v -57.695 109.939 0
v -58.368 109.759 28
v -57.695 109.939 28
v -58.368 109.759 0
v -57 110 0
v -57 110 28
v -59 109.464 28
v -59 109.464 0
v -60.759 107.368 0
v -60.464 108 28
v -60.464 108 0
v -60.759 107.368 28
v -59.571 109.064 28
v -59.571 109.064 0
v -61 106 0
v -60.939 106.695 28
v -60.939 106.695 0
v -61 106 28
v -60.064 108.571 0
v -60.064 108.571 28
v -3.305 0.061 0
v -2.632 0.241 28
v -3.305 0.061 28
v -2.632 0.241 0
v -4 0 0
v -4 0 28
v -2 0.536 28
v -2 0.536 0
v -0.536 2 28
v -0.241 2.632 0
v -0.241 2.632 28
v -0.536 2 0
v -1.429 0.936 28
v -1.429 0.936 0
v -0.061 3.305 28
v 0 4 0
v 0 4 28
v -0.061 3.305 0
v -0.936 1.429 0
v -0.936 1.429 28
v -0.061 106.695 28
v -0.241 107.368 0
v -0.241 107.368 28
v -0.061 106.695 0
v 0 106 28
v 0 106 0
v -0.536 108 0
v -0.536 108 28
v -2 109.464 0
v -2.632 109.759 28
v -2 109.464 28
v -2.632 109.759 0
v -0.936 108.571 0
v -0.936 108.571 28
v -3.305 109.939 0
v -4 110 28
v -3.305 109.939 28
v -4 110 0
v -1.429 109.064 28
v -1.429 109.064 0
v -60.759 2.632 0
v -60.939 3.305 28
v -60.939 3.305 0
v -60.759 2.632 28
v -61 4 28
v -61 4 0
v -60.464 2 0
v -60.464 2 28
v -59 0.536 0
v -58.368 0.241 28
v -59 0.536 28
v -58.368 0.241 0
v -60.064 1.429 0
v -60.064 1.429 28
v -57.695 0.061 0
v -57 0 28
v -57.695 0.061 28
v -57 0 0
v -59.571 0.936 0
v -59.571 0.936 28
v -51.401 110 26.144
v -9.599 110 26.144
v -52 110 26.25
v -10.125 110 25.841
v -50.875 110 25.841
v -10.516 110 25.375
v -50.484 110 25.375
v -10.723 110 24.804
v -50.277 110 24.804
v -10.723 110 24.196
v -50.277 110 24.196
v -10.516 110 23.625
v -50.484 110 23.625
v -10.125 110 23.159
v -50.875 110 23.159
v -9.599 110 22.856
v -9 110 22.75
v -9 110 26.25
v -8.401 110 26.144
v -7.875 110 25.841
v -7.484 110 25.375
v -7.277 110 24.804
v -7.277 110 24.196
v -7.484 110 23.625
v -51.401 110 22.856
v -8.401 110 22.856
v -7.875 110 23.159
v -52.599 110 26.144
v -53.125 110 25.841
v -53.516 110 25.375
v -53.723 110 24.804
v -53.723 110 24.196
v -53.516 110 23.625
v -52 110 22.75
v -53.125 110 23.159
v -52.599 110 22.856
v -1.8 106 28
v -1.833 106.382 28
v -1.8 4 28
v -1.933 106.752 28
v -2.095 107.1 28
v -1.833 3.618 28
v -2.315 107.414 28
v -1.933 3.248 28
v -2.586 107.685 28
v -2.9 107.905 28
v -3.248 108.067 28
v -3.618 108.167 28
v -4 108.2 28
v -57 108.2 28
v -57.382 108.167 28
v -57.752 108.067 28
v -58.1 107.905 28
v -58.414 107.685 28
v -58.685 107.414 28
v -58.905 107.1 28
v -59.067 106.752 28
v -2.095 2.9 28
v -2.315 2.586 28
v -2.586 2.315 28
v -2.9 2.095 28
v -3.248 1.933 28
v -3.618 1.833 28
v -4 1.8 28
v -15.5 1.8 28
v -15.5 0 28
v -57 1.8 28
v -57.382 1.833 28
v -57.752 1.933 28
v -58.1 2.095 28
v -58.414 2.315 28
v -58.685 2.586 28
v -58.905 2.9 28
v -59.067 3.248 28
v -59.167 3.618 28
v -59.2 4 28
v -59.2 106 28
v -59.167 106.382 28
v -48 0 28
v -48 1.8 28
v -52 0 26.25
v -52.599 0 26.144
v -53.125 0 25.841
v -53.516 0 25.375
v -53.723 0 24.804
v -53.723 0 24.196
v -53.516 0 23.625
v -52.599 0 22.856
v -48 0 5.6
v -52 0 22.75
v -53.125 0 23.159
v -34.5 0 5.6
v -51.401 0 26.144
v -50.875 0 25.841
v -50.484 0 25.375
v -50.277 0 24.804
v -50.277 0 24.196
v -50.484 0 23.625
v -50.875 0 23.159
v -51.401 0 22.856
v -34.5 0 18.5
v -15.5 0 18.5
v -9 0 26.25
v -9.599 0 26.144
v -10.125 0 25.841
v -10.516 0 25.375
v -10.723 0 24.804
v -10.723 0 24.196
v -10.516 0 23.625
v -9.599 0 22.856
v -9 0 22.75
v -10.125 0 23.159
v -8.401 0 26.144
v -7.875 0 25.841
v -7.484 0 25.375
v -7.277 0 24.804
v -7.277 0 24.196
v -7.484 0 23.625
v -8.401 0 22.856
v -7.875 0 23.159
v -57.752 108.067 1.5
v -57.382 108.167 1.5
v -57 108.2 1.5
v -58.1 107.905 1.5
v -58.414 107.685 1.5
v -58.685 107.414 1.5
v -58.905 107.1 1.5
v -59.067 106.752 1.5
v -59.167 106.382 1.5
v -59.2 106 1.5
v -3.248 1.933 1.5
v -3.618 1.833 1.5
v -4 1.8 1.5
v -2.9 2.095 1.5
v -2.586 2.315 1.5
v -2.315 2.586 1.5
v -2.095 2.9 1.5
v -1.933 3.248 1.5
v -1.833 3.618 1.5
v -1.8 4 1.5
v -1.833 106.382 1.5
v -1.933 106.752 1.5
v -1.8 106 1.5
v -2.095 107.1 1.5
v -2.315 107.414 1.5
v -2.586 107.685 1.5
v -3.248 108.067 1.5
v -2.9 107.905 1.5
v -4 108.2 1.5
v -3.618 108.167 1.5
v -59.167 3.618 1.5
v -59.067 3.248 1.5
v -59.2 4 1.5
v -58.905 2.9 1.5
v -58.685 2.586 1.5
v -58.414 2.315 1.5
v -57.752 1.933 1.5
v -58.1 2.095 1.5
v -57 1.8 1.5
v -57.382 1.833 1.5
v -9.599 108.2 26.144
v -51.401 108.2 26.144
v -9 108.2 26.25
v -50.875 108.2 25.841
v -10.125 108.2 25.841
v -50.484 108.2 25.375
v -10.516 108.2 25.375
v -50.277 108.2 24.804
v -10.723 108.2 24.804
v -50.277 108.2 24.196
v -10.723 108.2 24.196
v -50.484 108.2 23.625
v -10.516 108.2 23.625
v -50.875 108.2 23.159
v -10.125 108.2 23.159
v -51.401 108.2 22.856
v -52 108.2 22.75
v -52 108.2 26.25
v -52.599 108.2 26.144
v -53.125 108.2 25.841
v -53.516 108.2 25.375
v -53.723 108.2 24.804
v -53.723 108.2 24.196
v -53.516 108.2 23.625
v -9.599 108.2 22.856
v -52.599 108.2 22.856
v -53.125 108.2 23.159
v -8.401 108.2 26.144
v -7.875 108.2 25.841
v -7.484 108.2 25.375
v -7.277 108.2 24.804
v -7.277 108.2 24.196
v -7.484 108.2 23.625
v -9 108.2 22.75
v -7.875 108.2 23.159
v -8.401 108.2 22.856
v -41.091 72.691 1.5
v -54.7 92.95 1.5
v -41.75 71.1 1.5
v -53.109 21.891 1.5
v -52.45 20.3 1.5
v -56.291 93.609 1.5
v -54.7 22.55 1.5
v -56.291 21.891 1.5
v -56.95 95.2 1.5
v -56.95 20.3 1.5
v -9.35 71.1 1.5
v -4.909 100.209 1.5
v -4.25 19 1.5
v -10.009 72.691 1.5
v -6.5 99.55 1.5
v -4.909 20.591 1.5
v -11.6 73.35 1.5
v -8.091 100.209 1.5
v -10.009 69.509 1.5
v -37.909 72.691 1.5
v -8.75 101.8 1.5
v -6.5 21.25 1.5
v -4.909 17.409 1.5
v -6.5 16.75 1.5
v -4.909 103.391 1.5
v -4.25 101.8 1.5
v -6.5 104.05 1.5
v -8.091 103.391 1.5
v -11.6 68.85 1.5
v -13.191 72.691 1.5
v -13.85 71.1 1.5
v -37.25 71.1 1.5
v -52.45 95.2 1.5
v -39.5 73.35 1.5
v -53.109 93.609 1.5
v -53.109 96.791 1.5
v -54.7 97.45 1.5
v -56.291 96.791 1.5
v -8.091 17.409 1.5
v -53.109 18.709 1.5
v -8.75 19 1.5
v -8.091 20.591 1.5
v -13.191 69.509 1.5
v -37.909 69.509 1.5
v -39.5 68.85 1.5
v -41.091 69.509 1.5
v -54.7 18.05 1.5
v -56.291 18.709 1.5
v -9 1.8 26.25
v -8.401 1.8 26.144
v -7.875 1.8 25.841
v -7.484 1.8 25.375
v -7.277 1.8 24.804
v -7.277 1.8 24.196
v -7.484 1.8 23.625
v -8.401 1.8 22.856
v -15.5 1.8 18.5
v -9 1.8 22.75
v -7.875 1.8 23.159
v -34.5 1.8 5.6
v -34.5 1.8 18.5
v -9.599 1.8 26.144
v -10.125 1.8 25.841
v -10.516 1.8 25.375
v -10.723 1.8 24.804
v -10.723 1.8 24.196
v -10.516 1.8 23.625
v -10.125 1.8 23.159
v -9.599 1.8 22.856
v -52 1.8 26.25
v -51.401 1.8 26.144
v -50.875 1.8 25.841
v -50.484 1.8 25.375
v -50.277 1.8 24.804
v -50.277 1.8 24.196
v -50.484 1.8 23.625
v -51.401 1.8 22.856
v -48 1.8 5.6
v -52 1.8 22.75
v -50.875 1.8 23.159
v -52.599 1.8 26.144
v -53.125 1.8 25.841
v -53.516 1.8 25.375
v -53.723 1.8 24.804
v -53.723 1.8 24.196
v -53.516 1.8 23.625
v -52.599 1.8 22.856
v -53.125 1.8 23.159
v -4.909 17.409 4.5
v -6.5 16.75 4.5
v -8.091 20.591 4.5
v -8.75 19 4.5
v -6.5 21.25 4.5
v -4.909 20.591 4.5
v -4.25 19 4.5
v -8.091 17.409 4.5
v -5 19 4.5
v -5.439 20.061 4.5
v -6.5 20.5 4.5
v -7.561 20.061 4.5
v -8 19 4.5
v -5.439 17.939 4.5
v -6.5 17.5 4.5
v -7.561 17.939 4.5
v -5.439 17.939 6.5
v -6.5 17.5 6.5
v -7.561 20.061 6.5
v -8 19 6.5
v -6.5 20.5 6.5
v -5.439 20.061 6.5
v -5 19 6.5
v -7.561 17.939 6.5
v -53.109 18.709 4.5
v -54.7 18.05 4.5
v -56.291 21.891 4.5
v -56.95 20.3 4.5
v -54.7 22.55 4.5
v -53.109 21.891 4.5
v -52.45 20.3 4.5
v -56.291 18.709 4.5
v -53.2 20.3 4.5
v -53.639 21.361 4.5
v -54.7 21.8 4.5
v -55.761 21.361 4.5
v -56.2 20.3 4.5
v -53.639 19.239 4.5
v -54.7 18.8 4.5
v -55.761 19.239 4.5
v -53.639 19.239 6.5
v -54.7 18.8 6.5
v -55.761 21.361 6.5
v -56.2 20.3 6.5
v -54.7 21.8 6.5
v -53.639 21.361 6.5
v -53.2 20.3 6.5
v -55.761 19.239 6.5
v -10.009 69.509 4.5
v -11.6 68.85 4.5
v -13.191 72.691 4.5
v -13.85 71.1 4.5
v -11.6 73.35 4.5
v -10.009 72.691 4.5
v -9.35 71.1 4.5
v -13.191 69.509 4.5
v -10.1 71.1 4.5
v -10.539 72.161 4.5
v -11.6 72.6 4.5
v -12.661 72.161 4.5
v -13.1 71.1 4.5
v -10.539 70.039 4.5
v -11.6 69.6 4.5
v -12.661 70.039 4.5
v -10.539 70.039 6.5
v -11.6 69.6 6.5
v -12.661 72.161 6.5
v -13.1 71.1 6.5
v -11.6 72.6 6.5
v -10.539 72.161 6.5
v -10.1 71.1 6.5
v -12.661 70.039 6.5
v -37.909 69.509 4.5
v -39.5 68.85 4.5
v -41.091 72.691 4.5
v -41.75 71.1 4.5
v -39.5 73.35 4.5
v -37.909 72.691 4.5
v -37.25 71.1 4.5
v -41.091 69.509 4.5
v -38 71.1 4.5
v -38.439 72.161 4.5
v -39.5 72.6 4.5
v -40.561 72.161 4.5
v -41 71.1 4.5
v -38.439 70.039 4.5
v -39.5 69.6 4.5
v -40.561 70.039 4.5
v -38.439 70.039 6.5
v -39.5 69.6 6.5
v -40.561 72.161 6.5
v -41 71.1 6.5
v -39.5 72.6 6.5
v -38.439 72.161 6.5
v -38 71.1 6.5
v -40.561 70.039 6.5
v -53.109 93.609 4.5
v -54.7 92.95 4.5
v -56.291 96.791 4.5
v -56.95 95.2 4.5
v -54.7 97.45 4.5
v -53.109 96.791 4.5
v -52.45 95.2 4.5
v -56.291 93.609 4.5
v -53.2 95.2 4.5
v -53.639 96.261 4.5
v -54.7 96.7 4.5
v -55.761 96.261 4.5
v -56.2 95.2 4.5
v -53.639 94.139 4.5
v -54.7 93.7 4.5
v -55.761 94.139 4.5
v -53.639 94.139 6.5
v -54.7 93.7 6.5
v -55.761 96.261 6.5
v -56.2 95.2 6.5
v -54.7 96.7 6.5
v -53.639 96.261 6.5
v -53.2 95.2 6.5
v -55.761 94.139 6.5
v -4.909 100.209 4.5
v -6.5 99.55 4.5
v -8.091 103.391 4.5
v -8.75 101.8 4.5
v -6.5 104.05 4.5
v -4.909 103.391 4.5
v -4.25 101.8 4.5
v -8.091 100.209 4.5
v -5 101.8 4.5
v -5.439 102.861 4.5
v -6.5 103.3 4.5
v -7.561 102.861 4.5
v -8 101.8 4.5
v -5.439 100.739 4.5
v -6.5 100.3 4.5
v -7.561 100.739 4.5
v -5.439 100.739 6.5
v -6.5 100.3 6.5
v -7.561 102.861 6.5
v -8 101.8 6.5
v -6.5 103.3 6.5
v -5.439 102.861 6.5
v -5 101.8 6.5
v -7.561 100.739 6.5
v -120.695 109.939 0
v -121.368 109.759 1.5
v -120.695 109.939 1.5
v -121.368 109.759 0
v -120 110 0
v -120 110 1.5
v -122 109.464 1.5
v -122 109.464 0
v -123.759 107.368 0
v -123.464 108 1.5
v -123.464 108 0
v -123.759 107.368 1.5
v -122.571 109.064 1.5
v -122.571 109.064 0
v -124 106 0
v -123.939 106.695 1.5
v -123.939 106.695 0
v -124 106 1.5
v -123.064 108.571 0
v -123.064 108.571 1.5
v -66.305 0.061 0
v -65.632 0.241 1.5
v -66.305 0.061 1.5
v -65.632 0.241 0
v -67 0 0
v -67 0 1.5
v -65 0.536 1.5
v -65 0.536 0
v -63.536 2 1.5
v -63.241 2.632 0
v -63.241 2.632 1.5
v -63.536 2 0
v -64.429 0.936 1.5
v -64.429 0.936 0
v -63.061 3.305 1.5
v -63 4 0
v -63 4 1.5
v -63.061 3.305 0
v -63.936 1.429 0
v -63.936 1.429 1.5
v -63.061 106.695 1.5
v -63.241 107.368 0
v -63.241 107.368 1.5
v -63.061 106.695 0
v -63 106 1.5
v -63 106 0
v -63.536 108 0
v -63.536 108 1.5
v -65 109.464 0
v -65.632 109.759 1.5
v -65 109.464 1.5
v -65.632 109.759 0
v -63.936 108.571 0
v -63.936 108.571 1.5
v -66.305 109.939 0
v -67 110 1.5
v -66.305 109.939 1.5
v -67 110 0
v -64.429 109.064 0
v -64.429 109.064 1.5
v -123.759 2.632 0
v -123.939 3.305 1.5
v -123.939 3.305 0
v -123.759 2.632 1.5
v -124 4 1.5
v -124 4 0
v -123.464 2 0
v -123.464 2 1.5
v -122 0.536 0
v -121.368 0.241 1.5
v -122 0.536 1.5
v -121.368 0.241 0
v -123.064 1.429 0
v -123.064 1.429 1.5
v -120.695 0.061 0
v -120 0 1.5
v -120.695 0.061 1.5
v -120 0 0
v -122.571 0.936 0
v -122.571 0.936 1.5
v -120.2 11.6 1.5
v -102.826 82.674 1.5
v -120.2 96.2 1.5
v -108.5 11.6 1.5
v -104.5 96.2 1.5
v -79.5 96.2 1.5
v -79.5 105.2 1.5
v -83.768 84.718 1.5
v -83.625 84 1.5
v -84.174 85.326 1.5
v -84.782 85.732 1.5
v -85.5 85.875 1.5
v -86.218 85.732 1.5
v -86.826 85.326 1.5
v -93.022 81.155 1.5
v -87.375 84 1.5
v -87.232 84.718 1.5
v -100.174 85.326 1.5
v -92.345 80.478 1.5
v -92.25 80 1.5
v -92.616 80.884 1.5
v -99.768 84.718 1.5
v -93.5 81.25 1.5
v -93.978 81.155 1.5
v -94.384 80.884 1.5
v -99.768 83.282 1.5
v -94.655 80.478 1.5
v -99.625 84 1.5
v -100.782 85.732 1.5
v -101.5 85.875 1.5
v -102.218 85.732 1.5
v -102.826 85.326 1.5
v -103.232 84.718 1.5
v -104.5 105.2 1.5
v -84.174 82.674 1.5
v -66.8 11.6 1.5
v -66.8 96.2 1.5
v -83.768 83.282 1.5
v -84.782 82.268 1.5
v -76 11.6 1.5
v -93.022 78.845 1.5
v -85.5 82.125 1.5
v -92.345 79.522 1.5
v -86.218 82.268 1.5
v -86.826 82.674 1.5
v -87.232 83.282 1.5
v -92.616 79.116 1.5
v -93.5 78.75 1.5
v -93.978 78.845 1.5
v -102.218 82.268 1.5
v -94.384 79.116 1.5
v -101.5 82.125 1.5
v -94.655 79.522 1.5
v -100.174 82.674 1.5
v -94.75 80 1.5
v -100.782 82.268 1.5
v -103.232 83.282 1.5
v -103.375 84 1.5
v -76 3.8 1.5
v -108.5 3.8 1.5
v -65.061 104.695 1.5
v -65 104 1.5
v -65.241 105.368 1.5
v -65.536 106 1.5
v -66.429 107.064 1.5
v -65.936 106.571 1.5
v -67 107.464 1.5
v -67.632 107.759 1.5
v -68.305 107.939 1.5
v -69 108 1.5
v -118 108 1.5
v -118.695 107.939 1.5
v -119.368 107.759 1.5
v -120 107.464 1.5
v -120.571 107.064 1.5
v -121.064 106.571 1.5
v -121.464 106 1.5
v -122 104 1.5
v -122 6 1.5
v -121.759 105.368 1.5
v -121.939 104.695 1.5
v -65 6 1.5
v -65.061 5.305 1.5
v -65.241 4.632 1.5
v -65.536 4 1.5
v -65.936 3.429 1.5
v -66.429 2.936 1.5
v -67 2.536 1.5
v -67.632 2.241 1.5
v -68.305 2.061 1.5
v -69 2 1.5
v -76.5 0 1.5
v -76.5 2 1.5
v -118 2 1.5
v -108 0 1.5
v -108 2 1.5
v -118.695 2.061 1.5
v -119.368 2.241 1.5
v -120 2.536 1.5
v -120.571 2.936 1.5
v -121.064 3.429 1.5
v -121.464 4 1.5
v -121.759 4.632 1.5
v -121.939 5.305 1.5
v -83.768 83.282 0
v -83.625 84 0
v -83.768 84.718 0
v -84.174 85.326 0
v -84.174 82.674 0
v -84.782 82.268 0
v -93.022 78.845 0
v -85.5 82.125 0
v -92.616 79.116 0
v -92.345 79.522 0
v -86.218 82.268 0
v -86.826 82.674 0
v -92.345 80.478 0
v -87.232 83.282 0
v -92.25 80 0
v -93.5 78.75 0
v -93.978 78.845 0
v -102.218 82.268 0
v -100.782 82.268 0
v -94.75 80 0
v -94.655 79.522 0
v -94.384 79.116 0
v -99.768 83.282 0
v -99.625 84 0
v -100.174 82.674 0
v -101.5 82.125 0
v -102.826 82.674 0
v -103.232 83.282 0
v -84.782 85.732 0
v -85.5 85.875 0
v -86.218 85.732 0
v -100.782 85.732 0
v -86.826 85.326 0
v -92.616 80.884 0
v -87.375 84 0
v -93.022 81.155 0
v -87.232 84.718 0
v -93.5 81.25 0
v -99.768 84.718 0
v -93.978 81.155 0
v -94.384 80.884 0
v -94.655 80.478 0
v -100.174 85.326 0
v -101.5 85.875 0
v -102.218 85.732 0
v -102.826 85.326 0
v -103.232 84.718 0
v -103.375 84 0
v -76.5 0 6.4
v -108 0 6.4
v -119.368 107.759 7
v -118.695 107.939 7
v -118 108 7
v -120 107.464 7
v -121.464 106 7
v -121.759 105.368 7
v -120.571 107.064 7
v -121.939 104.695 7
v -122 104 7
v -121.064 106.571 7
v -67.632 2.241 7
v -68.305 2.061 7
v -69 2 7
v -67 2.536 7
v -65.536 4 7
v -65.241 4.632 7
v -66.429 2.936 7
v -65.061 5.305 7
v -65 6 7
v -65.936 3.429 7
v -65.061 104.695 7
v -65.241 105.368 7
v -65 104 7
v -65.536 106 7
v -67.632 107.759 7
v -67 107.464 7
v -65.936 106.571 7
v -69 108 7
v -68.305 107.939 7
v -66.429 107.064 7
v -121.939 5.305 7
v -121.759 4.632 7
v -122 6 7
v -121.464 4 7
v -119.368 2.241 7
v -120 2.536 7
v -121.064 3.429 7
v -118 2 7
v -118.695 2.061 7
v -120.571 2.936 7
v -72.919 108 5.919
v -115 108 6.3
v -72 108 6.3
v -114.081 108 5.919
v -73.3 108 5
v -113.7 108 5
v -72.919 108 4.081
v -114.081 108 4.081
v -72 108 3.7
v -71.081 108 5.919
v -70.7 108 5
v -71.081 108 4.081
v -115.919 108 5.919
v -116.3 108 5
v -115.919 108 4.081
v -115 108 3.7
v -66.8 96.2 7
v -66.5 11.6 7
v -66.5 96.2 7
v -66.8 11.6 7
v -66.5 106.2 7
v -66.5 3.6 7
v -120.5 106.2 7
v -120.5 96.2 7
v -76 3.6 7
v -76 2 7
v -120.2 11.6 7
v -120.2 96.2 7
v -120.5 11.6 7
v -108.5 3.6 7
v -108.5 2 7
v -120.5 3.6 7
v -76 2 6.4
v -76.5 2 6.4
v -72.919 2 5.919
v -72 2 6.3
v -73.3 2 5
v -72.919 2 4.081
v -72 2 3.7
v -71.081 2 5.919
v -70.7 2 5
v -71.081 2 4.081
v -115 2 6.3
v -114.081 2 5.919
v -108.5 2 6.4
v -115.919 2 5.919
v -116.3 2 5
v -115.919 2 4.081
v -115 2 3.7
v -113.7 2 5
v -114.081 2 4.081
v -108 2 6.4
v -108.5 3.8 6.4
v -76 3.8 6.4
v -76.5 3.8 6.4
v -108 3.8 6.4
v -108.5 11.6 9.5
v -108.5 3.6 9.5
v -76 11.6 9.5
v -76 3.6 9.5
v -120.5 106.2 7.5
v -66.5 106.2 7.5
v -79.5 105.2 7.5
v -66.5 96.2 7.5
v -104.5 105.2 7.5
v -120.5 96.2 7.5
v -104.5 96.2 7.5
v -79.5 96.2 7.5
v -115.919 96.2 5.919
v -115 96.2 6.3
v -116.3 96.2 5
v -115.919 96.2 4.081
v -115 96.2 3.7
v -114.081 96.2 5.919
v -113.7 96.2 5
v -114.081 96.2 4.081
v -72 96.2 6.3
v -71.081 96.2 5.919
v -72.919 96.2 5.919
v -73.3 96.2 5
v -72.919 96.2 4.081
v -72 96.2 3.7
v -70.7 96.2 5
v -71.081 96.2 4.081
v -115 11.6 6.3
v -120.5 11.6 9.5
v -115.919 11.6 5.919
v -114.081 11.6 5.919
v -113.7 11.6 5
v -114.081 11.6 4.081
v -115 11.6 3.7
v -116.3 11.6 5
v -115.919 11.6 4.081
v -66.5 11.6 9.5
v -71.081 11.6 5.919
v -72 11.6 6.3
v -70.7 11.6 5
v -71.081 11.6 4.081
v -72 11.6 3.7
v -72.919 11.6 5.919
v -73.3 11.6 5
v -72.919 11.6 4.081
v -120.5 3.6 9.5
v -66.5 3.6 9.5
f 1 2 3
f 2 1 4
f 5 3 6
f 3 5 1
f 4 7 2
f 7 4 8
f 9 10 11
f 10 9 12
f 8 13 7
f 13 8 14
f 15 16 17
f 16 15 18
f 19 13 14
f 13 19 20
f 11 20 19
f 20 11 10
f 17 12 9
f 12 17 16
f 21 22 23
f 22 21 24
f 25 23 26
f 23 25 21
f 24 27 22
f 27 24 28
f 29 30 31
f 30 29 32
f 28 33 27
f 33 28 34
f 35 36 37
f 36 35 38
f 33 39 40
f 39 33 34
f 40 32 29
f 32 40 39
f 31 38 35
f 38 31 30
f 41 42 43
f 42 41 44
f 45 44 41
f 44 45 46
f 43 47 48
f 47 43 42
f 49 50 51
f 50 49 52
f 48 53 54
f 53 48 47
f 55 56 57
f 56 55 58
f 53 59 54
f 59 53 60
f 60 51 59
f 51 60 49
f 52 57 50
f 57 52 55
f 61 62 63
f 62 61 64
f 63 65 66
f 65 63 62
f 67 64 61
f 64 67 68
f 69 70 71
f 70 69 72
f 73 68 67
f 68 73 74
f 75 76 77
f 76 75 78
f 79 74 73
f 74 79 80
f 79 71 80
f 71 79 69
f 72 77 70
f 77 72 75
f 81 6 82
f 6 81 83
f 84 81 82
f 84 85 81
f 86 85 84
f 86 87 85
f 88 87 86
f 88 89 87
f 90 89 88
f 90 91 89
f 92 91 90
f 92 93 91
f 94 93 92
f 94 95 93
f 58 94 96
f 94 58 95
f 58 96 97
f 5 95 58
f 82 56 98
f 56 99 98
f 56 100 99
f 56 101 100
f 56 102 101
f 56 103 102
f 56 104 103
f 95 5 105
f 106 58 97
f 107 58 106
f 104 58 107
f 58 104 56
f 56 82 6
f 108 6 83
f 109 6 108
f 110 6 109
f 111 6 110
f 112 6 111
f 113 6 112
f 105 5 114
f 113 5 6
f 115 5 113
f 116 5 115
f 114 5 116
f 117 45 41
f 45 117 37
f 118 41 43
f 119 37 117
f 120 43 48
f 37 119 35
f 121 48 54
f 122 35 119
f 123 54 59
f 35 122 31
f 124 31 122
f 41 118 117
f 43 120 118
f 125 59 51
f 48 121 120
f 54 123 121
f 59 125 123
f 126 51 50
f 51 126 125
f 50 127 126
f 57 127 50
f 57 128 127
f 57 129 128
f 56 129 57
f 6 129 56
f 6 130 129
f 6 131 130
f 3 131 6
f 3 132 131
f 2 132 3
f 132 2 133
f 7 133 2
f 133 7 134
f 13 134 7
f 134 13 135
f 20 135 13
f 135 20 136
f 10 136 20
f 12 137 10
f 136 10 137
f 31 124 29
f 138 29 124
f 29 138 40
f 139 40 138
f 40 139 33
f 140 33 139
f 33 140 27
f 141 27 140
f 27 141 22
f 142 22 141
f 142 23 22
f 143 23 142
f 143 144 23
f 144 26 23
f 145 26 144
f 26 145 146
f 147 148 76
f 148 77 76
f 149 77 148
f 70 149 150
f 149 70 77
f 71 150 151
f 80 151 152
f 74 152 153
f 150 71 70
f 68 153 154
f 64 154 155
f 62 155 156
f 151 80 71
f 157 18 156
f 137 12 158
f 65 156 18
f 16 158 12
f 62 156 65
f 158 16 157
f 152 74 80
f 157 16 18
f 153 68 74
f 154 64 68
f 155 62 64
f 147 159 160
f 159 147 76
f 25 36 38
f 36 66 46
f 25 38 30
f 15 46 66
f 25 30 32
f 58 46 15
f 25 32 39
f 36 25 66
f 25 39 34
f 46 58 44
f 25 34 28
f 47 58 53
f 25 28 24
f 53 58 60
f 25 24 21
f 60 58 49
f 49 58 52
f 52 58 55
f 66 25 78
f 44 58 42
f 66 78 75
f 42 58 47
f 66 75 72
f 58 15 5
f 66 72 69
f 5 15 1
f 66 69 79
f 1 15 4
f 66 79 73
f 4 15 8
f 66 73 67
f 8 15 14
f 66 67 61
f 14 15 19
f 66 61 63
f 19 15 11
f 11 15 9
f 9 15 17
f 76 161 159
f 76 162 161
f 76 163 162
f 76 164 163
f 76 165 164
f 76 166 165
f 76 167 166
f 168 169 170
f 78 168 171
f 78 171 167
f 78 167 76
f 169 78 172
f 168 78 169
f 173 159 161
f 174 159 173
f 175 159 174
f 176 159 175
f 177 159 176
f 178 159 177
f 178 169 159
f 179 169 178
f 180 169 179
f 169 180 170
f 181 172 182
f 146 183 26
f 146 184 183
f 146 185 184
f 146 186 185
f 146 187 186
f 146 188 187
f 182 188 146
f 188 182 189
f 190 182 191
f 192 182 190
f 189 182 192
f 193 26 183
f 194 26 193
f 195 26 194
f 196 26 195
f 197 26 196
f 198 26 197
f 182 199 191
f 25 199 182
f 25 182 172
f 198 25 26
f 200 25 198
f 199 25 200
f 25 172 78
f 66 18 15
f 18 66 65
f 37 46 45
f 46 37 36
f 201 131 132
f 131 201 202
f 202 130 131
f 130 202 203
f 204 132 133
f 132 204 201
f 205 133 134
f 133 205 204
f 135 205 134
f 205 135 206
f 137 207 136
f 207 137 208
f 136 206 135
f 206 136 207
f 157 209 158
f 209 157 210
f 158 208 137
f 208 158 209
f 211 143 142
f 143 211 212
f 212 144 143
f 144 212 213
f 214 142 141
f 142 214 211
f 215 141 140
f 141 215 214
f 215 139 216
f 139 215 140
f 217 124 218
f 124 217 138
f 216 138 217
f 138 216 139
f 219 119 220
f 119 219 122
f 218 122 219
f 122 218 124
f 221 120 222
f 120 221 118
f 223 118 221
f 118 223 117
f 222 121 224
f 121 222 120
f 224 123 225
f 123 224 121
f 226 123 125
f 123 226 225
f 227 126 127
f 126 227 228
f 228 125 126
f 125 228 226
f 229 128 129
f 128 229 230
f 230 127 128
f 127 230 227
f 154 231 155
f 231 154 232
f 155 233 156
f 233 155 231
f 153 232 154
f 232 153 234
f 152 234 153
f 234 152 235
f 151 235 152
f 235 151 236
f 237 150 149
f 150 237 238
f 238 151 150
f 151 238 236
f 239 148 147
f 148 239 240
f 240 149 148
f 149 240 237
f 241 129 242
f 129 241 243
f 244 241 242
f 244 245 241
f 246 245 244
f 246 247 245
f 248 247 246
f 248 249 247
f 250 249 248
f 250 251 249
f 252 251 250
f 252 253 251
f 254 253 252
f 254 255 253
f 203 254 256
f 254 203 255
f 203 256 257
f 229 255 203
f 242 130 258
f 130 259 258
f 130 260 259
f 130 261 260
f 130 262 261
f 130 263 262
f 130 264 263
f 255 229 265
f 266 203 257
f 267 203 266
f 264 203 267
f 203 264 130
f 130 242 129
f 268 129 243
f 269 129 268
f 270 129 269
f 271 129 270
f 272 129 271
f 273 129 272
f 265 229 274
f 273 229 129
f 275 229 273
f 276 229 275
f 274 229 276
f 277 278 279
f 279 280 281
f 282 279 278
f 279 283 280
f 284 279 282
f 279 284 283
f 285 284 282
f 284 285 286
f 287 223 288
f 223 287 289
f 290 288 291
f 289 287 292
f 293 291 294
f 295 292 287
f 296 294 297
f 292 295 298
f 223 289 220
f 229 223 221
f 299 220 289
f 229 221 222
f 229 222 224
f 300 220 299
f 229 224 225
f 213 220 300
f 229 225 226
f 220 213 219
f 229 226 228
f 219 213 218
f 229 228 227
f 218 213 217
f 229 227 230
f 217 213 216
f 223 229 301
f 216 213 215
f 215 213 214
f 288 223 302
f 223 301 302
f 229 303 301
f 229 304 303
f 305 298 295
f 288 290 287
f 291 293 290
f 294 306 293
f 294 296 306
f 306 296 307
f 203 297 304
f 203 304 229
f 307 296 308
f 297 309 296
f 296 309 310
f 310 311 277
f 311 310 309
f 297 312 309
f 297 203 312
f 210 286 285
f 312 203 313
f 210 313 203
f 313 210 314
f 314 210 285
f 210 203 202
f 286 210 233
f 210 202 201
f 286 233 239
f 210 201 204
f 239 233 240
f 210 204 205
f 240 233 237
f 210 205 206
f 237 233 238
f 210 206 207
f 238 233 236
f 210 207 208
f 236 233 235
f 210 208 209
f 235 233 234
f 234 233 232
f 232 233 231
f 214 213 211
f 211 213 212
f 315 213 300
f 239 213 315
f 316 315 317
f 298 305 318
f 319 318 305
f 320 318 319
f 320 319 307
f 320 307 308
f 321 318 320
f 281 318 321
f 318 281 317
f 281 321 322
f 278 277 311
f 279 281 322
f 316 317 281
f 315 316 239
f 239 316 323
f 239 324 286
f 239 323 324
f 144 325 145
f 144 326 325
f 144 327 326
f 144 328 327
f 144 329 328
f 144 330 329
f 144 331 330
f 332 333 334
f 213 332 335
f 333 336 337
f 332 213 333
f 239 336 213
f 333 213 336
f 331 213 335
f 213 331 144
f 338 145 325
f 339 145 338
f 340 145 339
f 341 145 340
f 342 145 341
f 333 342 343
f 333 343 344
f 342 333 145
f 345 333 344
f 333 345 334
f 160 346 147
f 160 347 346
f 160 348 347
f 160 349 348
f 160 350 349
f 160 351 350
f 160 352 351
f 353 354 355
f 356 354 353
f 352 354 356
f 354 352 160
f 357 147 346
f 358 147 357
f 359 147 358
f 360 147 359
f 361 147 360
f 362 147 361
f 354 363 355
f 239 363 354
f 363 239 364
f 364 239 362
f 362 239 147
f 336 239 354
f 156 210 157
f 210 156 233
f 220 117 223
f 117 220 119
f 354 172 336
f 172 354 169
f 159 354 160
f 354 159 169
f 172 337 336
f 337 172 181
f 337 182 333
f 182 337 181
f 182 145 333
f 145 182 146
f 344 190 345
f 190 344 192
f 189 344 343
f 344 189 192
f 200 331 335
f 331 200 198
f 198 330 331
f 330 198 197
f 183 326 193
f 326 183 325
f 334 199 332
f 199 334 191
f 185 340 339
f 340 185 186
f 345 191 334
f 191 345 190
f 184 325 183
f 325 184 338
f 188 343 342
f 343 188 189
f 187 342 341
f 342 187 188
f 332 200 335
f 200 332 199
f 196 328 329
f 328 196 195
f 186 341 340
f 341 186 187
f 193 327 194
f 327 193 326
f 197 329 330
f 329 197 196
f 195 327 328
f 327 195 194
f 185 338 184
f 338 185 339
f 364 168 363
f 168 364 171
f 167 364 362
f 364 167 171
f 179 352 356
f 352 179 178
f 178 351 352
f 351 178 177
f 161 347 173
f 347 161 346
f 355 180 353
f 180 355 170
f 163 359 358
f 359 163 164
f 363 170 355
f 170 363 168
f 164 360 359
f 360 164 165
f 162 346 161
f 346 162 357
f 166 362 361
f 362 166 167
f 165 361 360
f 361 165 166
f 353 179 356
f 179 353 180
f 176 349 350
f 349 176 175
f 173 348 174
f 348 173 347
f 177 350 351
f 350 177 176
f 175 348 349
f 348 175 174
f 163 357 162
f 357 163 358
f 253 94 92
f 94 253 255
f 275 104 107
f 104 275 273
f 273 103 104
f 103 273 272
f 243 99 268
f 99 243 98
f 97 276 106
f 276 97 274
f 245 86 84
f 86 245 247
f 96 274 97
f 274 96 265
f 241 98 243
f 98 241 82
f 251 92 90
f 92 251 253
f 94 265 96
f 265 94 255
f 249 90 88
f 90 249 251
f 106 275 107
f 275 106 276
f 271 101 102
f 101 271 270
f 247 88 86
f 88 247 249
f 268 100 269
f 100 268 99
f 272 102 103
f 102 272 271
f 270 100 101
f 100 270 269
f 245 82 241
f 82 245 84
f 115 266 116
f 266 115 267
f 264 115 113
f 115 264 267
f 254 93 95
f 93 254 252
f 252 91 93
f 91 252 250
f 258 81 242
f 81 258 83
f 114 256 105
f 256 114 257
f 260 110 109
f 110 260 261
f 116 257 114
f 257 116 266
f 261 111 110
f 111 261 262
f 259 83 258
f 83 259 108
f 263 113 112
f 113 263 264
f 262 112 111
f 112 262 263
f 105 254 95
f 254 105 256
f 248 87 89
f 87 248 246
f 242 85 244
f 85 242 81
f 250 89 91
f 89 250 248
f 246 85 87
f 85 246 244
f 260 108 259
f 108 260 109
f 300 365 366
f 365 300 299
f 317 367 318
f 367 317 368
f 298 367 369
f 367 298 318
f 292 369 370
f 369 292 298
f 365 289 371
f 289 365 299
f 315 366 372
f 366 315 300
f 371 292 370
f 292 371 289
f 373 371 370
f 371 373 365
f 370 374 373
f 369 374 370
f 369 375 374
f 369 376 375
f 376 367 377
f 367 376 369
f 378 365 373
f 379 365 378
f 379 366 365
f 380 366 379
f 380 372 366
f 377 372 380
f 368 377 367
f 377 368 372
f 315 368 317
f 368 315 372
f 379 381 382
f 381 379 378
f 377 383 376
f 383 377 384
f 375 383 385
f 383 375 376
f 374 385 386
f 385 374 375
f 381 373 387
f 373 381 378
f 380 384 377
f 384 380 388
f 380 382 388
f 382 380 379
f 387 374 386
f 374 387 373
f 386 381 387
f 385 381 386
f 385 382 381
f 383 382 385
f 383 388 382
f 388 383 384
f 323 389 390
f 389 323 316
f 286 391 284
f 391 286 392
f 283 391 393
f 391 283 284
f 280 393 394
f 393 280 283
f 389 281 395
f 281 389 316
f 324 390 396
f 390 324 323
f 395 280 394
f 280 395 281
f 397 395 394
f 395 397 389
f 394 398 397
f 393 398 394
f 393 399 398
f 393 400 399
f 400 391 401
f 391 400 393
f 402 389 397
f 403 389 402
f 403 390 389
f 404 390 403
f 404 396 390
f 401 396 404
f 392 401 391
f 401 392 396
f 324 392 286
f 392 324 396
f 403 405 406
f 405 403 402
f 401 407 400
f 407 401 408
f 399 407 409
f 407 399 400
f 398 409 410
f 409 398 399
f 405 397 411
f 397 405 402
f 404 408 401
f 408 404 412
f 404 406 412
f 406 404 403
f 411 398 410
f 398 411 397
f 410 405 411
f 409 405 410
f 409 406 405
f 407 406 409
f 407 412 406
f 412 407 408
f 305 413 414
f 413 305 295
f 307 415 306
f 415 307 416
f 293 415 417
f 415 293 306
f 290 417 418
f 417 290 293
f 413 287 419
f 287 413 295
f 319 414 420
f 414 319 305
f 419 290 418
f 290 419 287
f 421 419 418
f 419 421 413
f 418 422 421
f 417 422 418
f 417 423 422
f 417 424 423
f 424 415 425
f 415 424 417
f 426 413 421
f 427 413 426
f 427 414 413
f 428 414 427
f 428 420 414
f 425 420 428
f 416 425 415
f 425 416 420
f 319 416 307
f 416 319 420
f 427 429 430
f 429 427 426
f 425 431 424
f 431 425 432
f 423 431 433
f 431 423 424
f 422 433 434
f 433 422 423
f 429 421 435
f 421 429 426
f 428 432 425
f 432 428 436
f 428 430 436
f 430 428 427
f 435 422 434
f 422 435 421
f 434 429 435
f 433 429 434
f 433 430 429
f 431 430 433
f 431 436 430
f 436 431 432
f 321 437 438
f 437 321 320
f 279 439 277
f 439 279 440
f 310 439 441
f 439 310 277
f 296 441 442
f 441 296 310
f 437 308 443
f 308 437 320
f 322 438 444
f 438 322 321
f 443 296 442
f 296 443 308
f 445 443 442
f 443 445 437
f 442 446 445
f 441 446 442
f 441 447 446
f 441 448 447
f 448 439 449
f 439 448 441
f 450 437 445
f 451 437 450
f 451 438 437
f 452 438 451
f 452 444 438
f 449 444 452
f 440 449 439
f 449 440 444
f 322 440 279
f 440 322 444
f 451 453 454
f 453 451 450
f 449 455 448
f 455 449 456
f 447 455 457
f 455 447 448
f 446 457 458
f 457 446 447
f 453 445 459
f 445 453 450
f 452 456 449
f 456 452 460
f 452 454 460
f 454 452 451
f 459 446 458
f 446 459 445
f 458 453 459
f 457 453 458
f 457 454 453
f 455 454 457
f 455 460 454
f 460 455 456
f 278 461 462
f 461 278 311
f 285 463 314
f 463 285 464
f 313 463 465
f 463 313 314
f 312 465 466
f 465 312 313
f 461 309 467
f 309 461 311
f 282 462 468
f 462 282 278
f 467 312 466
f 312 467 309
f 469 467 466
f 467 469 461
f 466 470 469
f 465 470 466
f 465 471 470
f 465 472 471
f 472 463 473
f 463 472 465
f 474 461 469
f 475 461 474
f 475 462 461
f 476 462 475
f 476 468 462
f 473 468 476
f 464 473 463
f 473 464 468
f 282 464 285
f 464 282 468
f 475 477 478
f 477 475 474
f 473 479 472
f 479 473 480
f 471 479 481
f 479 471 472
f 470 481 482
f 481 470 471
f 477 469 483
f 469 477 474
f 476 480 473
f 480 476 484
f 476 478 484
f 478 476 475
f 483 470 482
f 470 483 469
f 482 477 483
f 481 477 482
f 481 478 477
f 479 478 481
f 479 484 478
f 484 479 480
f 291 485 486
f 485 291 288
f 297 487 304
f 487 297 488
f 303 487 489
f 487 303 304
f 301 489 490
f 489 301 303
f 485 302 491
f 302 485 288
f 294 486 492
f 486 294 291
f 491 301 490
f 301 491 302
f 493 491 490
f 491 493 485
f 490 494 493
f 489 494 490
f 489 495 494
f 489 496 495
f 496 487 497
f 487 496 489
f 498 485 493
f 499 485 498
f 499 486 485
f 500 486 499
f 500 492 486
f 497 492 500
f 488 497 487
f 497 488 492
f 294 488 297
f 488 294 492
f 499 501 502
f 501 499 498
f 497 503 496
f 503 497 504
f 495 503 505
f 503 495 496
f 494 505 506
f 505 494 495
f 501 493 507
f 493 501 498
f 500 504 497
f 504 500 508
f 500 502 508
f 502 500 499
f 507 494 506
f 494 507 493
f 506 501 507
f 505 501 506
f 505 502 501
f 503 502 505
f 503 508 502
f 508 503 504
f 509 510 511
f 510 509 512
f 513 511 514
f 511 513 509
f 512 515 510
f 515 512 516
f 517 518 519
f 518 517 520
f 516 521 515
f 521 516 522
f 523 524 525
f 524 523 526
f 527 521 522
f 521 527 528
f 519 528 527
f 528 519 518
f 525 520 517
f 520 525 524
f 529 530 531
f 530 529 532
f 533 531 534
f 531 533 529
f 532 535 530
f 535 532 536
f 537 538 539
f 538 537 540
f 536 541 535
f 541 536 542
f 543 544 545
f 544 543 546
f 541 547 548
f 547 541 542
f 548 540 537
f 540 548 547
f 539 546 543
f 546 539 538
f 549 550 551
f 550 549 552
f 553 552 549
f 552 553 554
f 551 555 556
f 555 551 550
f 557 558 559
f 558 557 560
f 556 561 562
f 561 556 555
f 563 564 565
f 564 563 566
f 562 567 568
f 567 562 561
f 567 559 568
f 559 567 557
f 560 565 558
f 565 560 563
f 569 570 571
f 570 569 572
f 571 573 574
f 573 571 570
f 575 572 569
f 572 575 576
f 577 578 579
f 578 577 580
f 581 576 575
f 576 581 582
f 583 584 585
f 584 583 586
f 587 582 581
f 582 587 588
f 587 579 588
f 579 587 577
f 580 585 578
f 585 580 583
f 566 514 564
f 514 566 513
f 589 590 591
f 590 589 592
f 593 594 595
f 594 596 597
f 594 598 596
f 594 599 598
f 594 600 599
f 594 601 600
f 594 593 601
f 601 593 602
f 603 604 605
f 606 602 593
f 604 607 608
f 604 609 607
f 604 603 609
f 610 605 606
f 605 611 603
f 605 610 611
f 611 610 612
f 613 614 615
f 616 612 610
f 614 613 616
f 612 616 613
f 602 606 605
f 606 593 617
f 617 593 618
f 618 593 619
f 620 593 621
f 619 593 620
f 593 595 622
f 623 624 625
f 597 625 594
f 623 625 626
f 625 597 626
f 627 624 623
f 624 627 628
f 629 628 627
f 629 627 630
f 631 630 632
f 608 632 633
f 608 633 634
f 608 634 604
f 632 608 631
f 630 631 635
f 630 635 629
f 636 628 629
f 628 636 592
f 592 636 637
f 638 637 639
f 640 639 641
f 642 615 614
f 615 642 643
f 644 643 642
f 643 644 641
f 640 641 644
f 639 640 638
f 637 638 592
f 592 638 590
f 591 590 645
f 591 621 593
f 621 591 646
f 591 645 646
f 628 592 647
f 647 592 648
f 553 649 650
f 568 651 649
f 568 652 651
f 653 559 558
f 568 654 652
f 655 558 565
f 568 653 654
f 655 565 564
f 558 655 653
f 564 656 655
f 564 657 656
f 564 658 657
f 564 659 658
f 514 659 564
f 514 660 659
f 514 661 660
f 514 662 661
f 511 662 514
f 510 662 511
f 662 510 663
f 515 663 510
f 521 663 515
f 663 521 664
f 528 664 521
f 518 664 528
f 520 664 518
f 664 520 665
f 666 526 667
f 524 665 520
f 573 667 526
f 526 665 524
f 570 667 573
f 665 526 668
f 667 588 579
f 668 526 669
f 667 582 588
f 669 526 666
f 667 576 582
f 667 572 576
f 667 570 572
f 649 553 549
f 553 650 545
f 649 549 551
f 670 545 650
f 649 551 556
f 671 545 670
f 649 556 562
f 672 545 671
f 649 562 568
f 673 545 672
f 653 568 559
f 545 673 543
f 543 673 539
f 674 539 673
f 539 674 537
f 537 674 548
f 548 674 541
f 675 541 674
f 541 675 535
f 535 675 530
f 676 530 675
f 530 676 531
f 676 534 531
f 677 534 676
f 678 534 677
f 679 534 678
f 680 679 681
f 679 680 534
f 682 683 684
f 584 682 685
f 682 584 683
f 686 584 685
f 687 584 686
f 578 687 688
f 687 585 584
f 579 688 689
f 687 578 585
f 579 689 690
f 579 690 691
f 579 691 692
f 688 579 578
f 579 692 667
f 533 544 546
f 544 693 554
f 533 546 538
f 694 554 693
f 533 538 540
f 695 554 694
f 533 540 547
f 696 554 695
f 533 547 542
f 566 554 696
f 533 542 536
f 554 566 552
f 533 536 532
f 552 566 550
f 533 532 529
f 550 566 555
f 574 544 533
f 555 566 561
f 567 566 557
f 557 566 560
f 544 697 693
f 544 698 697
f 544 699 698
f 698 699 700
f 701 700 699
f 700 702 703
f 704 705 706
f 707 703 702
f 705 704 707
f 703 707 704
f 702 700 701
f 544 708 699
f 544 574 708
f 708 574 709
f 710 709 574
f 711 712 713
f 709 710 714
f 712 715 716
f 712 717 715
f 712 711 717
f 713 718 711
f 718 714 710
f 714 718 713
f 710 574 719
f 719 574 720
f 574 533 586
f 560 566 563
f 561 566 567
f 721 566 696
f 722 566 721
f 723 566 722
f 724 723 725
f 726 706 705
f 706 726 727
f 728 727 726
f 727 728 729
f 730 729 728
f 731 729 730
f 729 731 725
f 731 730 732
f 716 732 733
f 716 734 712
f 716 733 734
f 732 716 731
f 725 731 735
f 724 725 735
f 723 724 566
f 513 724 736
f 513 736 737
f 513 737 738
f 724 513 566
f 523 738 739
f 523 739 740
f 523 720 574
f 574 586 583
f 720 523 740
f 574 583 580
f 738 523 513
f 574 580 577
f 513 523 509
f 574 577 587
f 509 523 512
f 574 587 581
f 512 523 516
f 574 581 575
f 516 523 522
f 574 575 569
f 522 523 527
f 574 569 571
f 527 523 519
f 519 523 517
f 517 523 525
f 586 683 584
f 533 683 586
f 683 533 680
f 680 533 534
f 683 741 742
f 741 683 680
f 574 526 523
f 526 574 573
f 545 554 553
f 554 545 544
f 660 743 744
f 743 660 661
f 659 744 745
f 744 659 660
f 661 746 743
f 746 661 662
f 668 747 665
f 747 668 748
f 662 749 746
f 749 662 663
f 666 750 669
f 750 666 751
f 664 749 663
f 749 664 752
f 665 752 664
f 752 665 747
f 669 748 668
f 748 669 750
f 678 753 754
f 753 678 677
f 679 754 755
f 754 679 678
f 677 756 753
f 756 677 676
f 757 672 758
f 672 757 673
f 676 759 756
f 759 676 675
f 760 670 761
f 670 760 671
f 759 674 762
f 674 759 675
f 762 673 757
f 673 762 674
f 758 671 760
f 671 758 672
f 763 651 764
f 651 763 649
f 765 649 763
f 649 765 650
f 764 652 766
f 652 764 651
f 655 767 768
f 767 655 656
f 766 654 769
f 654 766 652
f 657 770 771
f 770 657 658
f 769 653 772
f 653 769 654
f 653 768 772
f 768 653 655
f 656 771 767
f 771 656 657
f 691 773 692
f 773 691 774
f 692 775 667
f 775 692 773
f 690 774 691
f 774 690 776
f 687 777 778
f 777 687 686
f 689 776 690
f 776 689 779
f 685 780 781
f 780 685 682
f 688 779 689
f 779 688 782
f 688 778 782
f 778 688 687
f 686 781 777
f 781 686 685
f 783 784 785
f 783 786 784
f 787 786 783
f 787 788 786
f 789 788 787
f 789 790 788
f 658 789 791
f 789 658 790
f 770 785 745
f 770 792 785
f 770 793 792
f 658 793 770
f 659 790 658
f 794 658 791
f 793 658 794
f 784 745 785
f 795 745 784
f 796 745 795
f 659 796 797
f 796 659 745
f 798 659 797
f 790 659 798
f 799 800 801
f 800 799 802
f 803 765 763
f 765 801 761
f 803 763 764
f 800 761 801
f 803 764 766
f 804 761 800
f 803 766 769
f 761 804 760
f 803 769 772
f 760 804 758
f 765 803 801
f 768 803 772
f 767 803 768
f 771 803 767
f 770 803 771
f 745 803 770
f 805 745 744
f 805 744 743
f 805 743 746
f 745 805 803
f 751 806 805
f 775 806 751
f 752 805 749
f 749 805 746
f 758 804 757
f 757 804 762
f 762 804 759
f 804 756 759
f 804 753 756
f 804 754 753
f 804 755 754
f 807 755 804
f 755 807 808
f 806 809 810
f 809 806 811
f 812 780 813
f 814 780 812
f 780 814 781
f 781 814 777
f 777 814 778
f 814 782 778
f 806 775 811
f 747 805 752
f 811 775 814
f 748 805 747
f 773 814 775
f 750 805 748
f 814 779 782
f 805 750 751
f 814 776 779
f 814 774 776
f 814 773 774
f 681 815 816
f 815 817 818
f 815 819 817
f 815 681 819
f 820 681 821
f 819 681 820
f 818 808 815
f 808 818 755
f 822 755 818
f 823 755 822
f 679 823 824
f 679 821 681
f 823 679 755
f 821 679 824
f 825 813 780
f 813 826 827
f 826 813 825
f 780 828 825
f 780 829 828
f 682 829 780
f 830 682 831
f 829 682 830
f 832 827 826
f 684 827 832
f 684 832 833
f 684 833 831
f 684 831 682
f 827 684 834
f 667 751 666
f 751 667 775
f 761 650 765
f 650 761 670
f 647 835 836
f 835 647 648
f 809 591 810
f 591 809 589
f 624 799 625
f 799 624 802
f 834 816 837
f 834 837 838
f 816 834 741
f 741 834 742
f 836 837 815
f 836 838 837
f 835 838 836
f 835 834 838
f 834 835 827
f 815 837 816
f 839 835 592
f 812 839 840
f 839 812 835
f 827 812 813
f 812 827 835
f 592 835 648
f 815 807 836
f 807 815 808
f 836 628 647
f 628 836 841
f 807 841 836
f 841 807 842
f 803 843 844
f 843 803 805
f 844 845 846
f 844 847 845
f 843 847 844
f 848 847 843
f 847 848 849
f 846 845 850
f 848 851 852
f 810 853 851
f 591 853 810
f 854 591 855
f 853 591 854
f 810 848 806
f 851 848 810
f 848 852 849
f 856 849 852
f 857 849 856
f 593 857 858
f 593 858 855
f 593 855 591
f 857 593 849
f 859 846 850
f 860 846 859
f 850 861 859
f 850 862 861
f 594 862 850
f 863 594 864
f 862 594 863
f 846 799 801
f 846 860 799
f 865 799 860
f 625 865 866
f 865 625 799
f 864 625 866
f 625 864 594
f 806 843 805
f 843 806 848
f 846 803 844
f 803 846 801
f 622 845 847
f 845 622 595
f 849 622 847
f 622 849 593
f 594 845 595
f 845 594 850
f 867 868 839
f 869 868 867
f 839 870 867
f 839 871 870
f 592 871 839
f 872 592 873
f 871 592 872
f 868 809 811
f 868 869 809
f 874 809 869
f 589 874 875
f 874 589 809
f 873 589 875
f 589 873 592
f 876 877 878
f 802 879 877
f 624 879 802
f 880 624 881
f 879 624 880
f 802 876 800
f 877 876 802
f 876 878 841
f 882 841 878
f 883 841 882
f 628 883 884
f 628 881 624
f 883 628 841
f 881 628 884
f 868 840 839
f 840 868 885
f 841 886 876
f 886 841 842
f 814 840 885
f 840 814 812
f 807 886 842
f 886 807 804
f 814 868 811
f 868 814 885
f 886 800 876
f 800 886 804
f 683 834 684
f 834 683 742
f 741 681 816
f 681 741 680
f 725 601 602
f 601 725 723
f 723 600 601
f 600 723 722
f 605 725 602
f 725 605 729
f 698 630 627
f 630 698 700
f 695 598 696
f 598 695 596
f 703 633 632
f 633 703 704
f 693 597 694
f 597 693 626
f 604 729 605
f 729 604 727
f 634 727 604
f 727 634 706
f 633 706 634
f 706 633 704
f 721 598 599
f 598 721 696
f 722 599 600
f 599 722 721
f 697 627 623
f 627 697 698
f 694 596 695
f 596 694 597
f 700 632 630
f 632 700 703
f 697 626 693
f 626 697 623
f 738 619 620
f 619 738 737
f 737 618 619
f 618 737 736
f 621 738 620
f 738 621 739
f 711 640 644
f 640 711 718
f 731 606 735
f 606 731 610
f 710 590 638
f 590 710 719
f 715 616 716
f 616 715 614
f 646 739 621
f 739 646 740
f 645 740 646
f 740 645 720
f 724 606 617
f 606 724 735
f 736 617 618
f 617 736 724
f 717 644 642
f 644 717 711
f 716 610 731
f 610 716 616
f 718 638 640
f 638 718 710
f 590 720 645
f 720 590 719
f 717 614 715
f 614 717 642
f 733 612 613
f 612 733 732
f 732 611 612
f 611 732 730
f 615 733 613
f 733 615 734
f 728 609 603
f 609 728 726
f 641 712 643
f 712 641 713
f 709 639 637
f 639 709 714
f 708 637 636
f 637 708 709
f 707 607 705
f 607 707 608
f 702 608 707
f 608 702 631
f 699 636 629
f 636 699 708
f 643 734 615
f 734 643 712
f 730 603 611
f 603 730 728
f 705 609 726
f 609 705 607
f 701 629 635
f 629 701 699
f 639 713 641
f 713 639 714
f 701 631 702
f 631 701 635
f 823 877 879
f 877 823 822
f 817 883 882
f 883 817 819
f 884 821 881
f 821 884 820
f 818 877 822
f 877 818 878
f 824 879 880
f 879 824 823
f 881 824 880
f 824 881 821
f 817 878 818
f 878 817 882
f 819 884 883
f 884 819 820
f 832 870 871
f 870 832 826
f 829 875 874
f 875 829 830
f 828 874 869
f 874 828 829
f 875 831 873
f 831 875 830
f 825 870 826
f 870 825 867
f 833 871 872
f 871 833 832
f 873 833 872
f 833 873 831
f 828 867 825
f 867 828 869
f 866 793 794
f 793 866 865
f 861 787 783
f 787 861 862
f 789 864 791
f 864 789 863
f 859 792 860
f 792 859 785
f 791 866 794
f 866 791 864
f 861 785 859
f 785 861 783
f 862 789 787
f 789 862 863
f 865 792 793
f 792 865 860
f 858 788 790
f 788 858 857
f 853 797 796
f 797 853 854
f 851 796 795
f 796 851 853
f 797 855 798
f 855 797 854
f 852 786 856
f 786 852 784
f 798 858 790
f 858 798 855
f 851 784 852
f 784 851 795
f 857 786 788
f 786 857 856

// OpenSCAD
// Box for Mega & shield based EEPROM programmer
// Print at .3mm layer height, 30% infill, 1 extra shell.

Show = 0;  // Set to true to show the assembly

Num2HoleDia = 2.6; // #2 screw hole diameter
Num2ClearHoleDia = 3.5; // #2 screw clearance hole
Hole6_32Tap = 2.8; // 6-32 tap hole
Hole6_32Clear = 3.75; // 6-32 clearance hole

// Box dimensions
WallThk = 1.8;
BaseThk = 1.5;
BoxX = 110;
BoxY = 61;
BoxThk = 28;
Rnd = 4;  // Diameter of rounding on corners

// Lid dimensions
LidThk = 1.5;
LipThk = 7;
LipInset = .2;
LidScrewDown = 3.5;
LidScrewIn = 9;

// Arduino MEGA mounting stud dimensions
MegaStudX = [14,15.3,66.1,66.1,90.2,96.8];
MegaStudY = [2.5,50.7,7.6,35.5,50.7,2.5];
MegaStudDia = 3;
MegaStudHgt = 2;
MegaStudBaseDia = 4.5;
MegaStudBaseHgt = 3;
MegaMountX = 5;
MegaMountY = 4;
MegaBoardThk = 1.8;

// Board stack dimensions
MegaStackX = 0;
MegaStackY = 0;
MegaStackWid = 54;
MegaStackThkFrnt = 15.5;
MegaStackThkBack = 17.5;
MegaStackLen = 102;

// USB hole dimensions
USBwid = 13.5;
USBhgt = 14;
USBy = 30.5;
USBz = 1.1;

// SD card hole dimensions
SDwid = 32.5;
SDtop = 4.9;
SDhgt = 10;
SDy = 11.5;
SDz = 14;


	// Do the box
	rotate([0,0,90])
		DrawBox();

	// Do the lid
	if (Show)
	{

		translate([-BoxY,0,BoxThk+LidThk+10])
			rotate([0,180,-90])
				color("RED")
					DrawLid();

		// Show Mega and shield boards
		rotate([0,0,90])
			translate([MegaMountX,MegaMountX,MegaStudBaseHgt+BaseThk])
				color("GREEN")
				union()
				{
					cube([MegaStackLen,MegaStackWid,MegaStackThkFrnt]);
					translate([MegaStackLen-10,0,0])
						cube([10,MegaStackWid,MegaStackThkBack]);
				}
	}
	else
		translate([-BoxY-2,0,0])
			rotate([0,0,90])
				DrawLid();

module DrawLid()
{
	// Draw box lid
	difference()
	{
		union()
		{
			RndCube(BoxX,BoxY,LidThk);  // Lid
			difference()  // Do lip
			{
				translate([WallThk+LipInset,WallThk+LipInset,0])
					RndCube(BoxX-(2*WallThk)-(2*LipInset),BoxY-(2*WallThk)-(2*LipInset),LipThk);
				translate([WallThk*2+LipInset,WallThk*2+LipInset,LidThk])
					RndCube(BoxX-(4*WallThk)-(2*LipInset),BoxY-(4*WallThk)-(2*LipInset),LipThk); // Sub out inside of lid
				translate([WallThk-1,BoxY-(SDy+MegaMountY)-(SDwid),LidThk+SDtop])  // Opening for SD card
					cube([WallThk+2,SDwid,LipThk]);
			}
			translate([0,BoxY-(SDy+MegaMountY)-(SDwid-.5),LidThk])  // Top of opening for SD card
				cube([WallThk+2,SDwid-1,SDtop]);

			// Back board hold down
			translate([BoxX-WallThk*2-10-LipInset,WallThk+LipInset+1.5,LidThk])
				difference()
				{
					cube([10,BoxY-2*WallThk-2*LipInset-3,BoxThk-(MegaStudBaseHgt+BaseThk+MegaStackThkBack)]);
					translate([-1,13,-2])
						cube([10,25,12]);
				}

			// Front board hold downs
			translate([WallThk*2,WallThk+LipInset+1.5,LidThk])
				difference()
				{
					cube([8,BoxY-2*WallThk-2*LipInset-3,BoxThk-(MegaStudBaseHgt+BaseThk+MegaStackThkFrnt)]);
					translate([-1,BoxY-(SDy+MegaMountY)-(SDwid-.5)-(WallThk+LipInset+2),-2])
						cube([10,SDwid,12]);
				}
		}

		// Do mounting holes for terminal strip
		translate([84,BoxY/2-8,0])
			cylinder(h=7,d=Hole6_32Clear,center=true,$fn=16);
		translate([84,BoxY/2+8,0])  // Must be 8mm*2 from other hole
			cylinder(h=7,d=Hole6_32Clear,center=true,$fn=16);

		// Do hole for wires
		translate([80,BoxY/2,0])
			cylinder(h=7,d=4,d=2.5,center=true,$fn=16);

		// Holes for lid screws
		translate([0,LidScrewIn,LidScrewDown+LidThk])
			rotate([0,90,0])
				cylinder(h=30,d=Num2HoleDia,$fn=8,center=true);
		translate([0,BoxY-LidScrewIn,LidScrewDown+LidThk])
			rotate([0,90,0])
				cylinder(h=30,d=Num2HoleDia,$fn=8,center=true);
		translate([BoxX,LidScrewIn,LidScrewDown+LidThk])
			rotate([0,90,0])
				cylinder(h=30,d=Num2HoleDia,$fn=8,center=true);
		translate([BoxX,BoxY-LidScrewIn,LidScrewDown+LidThk])
			rotate([0,90,0])
				cylinder(h=30,d=Num2HoleDia,$fn=8,center=true);

	// Sub out lightning holes
//	translate([14,5.5,-1])
//		cube([69,50,LidThk+2]);
	}
}

module DrawBox()
{
	// Draw project box
	difference()
	{
		// Do base
		union()
		{
			difference()
			{
				RndCube(BoxX,BoxY,BoxThk);
				translate([WallThk,WallThk,BaseThk])
					RndCube(BoxX-2*WallThk,BoxY-2*WallThk,BoxThk,Rnd-WallThk); // Sub out inside of box

	// Sub out lightning holes
//	translate([MegaMountX+17,MegaMountY+3,-1])
//		cube([46,45,BaseThk+2]);
//	translate([MegaMountX+69,MegaMountY+3,-1])
//		cube([25,45,BaseThk+2]);
//	translate([MegaMountX,MegaMountY+3,-1])
//		cube([11,45,BaseThk+2]);

				// USB hole
				translate([-1,USBy+MegaMountY,MegaStudBaseHgt+BaseThk+USBz])
					cube([WallThk+2,USBwid,USBhgt]);

				// SD card hole
				translate([-1,SDy+MegaMountY,MegaStudBaseHgt+BaseThk+SDz])
					cube([WallThk+2,SDwid,SDhgt]);

				// Holes for lid screws
				translate([0,LidScrewIn,BoxThk-LidScrewDown])
					rotate([0,90,0])
						cylinder(h=30,d=Num2ClearHoleDia,$fn=18,center=true);
				translate([0,BoxY-LidScrewIn,BoxThk-LidScrewDown])
					rotate([0,90,0])
						cylinder(h=30,d=Num2ClearHoleDia,$fn=18,center=true);
				translate([BoxX,LidScrewIn,BoxThk-LidScrewDown])
					rotate([0,90,0])
						cylinder(h=30,d=Num2ClearHoleDia,$fn=18,center=true);
				translate([BoxX,BoxY-LidScrewIn,BoxThk-LidScrewDown])
					rotate([0,90,0])
						cylinder(h=30,d=Num2ClearHoleDia,$fn=18,center=true);

	// Sub out the sides
//	translate([10,-5,8])
//		cube([85,10,35]);
//	translate([10,BoxY-5,8])
//		cube([85,10,35]);
			}

			translate([MegaMountX,MegaMountY,0]) // MEGA Mount
				DoMegaMount();
		}
	}
}
// Routine to do mounting studs for an Arduino MEGA board
module DoMegaMount()
{
	// Do studs
	for (cnt = [0:5])
		translate([MegaStudX[cnt],MegaStudY[cnt],0])
			union()
			{
				cylinder(d=MegaStudBaseDia,h=MegaStudBaseHgt+BaseThk,$fn=8);
				cylinder(d=MegaStudDia,h=MegaStudHgt+MegaStudBaseHgt+BaseThk,$fn=8);
			}
}

// Routine to make a rounded cube
module RndCube(Wid,Hgt,Thk,RndDia = Rnd)
{
	difference()
	{
		cube([Wid,Hgt,Thk]);
		translate([Wid-RndDia,Hgt-RndDia,0])
			RndTool(RndDia,Thk);
		translate([RndDia,RndDia,0])
			rotate([0,0,180])
				RndTool(RndDia,Thk);
		translate([Wid-RndDia,RndDia,0])
			rotate([0,0,270])
				RndTool(RndDia,Thk);
		translate([RndDia,Hgt-RndDia,0])
			rotate([0,0,90])
				RndTool(RndDia,Thk);
	}
}

// Routine to make the tool for rounding a vertical corner
module RndTool(Rad, Thk)
{
	translate([0,0,-1])
		difference()
		{
			cube([2*Rad,2*Rad,Thk+2]);
			translate([0,0,-1])
				cylinder(Thk+4,Rad,Rad,$fn=36);
		}
}
